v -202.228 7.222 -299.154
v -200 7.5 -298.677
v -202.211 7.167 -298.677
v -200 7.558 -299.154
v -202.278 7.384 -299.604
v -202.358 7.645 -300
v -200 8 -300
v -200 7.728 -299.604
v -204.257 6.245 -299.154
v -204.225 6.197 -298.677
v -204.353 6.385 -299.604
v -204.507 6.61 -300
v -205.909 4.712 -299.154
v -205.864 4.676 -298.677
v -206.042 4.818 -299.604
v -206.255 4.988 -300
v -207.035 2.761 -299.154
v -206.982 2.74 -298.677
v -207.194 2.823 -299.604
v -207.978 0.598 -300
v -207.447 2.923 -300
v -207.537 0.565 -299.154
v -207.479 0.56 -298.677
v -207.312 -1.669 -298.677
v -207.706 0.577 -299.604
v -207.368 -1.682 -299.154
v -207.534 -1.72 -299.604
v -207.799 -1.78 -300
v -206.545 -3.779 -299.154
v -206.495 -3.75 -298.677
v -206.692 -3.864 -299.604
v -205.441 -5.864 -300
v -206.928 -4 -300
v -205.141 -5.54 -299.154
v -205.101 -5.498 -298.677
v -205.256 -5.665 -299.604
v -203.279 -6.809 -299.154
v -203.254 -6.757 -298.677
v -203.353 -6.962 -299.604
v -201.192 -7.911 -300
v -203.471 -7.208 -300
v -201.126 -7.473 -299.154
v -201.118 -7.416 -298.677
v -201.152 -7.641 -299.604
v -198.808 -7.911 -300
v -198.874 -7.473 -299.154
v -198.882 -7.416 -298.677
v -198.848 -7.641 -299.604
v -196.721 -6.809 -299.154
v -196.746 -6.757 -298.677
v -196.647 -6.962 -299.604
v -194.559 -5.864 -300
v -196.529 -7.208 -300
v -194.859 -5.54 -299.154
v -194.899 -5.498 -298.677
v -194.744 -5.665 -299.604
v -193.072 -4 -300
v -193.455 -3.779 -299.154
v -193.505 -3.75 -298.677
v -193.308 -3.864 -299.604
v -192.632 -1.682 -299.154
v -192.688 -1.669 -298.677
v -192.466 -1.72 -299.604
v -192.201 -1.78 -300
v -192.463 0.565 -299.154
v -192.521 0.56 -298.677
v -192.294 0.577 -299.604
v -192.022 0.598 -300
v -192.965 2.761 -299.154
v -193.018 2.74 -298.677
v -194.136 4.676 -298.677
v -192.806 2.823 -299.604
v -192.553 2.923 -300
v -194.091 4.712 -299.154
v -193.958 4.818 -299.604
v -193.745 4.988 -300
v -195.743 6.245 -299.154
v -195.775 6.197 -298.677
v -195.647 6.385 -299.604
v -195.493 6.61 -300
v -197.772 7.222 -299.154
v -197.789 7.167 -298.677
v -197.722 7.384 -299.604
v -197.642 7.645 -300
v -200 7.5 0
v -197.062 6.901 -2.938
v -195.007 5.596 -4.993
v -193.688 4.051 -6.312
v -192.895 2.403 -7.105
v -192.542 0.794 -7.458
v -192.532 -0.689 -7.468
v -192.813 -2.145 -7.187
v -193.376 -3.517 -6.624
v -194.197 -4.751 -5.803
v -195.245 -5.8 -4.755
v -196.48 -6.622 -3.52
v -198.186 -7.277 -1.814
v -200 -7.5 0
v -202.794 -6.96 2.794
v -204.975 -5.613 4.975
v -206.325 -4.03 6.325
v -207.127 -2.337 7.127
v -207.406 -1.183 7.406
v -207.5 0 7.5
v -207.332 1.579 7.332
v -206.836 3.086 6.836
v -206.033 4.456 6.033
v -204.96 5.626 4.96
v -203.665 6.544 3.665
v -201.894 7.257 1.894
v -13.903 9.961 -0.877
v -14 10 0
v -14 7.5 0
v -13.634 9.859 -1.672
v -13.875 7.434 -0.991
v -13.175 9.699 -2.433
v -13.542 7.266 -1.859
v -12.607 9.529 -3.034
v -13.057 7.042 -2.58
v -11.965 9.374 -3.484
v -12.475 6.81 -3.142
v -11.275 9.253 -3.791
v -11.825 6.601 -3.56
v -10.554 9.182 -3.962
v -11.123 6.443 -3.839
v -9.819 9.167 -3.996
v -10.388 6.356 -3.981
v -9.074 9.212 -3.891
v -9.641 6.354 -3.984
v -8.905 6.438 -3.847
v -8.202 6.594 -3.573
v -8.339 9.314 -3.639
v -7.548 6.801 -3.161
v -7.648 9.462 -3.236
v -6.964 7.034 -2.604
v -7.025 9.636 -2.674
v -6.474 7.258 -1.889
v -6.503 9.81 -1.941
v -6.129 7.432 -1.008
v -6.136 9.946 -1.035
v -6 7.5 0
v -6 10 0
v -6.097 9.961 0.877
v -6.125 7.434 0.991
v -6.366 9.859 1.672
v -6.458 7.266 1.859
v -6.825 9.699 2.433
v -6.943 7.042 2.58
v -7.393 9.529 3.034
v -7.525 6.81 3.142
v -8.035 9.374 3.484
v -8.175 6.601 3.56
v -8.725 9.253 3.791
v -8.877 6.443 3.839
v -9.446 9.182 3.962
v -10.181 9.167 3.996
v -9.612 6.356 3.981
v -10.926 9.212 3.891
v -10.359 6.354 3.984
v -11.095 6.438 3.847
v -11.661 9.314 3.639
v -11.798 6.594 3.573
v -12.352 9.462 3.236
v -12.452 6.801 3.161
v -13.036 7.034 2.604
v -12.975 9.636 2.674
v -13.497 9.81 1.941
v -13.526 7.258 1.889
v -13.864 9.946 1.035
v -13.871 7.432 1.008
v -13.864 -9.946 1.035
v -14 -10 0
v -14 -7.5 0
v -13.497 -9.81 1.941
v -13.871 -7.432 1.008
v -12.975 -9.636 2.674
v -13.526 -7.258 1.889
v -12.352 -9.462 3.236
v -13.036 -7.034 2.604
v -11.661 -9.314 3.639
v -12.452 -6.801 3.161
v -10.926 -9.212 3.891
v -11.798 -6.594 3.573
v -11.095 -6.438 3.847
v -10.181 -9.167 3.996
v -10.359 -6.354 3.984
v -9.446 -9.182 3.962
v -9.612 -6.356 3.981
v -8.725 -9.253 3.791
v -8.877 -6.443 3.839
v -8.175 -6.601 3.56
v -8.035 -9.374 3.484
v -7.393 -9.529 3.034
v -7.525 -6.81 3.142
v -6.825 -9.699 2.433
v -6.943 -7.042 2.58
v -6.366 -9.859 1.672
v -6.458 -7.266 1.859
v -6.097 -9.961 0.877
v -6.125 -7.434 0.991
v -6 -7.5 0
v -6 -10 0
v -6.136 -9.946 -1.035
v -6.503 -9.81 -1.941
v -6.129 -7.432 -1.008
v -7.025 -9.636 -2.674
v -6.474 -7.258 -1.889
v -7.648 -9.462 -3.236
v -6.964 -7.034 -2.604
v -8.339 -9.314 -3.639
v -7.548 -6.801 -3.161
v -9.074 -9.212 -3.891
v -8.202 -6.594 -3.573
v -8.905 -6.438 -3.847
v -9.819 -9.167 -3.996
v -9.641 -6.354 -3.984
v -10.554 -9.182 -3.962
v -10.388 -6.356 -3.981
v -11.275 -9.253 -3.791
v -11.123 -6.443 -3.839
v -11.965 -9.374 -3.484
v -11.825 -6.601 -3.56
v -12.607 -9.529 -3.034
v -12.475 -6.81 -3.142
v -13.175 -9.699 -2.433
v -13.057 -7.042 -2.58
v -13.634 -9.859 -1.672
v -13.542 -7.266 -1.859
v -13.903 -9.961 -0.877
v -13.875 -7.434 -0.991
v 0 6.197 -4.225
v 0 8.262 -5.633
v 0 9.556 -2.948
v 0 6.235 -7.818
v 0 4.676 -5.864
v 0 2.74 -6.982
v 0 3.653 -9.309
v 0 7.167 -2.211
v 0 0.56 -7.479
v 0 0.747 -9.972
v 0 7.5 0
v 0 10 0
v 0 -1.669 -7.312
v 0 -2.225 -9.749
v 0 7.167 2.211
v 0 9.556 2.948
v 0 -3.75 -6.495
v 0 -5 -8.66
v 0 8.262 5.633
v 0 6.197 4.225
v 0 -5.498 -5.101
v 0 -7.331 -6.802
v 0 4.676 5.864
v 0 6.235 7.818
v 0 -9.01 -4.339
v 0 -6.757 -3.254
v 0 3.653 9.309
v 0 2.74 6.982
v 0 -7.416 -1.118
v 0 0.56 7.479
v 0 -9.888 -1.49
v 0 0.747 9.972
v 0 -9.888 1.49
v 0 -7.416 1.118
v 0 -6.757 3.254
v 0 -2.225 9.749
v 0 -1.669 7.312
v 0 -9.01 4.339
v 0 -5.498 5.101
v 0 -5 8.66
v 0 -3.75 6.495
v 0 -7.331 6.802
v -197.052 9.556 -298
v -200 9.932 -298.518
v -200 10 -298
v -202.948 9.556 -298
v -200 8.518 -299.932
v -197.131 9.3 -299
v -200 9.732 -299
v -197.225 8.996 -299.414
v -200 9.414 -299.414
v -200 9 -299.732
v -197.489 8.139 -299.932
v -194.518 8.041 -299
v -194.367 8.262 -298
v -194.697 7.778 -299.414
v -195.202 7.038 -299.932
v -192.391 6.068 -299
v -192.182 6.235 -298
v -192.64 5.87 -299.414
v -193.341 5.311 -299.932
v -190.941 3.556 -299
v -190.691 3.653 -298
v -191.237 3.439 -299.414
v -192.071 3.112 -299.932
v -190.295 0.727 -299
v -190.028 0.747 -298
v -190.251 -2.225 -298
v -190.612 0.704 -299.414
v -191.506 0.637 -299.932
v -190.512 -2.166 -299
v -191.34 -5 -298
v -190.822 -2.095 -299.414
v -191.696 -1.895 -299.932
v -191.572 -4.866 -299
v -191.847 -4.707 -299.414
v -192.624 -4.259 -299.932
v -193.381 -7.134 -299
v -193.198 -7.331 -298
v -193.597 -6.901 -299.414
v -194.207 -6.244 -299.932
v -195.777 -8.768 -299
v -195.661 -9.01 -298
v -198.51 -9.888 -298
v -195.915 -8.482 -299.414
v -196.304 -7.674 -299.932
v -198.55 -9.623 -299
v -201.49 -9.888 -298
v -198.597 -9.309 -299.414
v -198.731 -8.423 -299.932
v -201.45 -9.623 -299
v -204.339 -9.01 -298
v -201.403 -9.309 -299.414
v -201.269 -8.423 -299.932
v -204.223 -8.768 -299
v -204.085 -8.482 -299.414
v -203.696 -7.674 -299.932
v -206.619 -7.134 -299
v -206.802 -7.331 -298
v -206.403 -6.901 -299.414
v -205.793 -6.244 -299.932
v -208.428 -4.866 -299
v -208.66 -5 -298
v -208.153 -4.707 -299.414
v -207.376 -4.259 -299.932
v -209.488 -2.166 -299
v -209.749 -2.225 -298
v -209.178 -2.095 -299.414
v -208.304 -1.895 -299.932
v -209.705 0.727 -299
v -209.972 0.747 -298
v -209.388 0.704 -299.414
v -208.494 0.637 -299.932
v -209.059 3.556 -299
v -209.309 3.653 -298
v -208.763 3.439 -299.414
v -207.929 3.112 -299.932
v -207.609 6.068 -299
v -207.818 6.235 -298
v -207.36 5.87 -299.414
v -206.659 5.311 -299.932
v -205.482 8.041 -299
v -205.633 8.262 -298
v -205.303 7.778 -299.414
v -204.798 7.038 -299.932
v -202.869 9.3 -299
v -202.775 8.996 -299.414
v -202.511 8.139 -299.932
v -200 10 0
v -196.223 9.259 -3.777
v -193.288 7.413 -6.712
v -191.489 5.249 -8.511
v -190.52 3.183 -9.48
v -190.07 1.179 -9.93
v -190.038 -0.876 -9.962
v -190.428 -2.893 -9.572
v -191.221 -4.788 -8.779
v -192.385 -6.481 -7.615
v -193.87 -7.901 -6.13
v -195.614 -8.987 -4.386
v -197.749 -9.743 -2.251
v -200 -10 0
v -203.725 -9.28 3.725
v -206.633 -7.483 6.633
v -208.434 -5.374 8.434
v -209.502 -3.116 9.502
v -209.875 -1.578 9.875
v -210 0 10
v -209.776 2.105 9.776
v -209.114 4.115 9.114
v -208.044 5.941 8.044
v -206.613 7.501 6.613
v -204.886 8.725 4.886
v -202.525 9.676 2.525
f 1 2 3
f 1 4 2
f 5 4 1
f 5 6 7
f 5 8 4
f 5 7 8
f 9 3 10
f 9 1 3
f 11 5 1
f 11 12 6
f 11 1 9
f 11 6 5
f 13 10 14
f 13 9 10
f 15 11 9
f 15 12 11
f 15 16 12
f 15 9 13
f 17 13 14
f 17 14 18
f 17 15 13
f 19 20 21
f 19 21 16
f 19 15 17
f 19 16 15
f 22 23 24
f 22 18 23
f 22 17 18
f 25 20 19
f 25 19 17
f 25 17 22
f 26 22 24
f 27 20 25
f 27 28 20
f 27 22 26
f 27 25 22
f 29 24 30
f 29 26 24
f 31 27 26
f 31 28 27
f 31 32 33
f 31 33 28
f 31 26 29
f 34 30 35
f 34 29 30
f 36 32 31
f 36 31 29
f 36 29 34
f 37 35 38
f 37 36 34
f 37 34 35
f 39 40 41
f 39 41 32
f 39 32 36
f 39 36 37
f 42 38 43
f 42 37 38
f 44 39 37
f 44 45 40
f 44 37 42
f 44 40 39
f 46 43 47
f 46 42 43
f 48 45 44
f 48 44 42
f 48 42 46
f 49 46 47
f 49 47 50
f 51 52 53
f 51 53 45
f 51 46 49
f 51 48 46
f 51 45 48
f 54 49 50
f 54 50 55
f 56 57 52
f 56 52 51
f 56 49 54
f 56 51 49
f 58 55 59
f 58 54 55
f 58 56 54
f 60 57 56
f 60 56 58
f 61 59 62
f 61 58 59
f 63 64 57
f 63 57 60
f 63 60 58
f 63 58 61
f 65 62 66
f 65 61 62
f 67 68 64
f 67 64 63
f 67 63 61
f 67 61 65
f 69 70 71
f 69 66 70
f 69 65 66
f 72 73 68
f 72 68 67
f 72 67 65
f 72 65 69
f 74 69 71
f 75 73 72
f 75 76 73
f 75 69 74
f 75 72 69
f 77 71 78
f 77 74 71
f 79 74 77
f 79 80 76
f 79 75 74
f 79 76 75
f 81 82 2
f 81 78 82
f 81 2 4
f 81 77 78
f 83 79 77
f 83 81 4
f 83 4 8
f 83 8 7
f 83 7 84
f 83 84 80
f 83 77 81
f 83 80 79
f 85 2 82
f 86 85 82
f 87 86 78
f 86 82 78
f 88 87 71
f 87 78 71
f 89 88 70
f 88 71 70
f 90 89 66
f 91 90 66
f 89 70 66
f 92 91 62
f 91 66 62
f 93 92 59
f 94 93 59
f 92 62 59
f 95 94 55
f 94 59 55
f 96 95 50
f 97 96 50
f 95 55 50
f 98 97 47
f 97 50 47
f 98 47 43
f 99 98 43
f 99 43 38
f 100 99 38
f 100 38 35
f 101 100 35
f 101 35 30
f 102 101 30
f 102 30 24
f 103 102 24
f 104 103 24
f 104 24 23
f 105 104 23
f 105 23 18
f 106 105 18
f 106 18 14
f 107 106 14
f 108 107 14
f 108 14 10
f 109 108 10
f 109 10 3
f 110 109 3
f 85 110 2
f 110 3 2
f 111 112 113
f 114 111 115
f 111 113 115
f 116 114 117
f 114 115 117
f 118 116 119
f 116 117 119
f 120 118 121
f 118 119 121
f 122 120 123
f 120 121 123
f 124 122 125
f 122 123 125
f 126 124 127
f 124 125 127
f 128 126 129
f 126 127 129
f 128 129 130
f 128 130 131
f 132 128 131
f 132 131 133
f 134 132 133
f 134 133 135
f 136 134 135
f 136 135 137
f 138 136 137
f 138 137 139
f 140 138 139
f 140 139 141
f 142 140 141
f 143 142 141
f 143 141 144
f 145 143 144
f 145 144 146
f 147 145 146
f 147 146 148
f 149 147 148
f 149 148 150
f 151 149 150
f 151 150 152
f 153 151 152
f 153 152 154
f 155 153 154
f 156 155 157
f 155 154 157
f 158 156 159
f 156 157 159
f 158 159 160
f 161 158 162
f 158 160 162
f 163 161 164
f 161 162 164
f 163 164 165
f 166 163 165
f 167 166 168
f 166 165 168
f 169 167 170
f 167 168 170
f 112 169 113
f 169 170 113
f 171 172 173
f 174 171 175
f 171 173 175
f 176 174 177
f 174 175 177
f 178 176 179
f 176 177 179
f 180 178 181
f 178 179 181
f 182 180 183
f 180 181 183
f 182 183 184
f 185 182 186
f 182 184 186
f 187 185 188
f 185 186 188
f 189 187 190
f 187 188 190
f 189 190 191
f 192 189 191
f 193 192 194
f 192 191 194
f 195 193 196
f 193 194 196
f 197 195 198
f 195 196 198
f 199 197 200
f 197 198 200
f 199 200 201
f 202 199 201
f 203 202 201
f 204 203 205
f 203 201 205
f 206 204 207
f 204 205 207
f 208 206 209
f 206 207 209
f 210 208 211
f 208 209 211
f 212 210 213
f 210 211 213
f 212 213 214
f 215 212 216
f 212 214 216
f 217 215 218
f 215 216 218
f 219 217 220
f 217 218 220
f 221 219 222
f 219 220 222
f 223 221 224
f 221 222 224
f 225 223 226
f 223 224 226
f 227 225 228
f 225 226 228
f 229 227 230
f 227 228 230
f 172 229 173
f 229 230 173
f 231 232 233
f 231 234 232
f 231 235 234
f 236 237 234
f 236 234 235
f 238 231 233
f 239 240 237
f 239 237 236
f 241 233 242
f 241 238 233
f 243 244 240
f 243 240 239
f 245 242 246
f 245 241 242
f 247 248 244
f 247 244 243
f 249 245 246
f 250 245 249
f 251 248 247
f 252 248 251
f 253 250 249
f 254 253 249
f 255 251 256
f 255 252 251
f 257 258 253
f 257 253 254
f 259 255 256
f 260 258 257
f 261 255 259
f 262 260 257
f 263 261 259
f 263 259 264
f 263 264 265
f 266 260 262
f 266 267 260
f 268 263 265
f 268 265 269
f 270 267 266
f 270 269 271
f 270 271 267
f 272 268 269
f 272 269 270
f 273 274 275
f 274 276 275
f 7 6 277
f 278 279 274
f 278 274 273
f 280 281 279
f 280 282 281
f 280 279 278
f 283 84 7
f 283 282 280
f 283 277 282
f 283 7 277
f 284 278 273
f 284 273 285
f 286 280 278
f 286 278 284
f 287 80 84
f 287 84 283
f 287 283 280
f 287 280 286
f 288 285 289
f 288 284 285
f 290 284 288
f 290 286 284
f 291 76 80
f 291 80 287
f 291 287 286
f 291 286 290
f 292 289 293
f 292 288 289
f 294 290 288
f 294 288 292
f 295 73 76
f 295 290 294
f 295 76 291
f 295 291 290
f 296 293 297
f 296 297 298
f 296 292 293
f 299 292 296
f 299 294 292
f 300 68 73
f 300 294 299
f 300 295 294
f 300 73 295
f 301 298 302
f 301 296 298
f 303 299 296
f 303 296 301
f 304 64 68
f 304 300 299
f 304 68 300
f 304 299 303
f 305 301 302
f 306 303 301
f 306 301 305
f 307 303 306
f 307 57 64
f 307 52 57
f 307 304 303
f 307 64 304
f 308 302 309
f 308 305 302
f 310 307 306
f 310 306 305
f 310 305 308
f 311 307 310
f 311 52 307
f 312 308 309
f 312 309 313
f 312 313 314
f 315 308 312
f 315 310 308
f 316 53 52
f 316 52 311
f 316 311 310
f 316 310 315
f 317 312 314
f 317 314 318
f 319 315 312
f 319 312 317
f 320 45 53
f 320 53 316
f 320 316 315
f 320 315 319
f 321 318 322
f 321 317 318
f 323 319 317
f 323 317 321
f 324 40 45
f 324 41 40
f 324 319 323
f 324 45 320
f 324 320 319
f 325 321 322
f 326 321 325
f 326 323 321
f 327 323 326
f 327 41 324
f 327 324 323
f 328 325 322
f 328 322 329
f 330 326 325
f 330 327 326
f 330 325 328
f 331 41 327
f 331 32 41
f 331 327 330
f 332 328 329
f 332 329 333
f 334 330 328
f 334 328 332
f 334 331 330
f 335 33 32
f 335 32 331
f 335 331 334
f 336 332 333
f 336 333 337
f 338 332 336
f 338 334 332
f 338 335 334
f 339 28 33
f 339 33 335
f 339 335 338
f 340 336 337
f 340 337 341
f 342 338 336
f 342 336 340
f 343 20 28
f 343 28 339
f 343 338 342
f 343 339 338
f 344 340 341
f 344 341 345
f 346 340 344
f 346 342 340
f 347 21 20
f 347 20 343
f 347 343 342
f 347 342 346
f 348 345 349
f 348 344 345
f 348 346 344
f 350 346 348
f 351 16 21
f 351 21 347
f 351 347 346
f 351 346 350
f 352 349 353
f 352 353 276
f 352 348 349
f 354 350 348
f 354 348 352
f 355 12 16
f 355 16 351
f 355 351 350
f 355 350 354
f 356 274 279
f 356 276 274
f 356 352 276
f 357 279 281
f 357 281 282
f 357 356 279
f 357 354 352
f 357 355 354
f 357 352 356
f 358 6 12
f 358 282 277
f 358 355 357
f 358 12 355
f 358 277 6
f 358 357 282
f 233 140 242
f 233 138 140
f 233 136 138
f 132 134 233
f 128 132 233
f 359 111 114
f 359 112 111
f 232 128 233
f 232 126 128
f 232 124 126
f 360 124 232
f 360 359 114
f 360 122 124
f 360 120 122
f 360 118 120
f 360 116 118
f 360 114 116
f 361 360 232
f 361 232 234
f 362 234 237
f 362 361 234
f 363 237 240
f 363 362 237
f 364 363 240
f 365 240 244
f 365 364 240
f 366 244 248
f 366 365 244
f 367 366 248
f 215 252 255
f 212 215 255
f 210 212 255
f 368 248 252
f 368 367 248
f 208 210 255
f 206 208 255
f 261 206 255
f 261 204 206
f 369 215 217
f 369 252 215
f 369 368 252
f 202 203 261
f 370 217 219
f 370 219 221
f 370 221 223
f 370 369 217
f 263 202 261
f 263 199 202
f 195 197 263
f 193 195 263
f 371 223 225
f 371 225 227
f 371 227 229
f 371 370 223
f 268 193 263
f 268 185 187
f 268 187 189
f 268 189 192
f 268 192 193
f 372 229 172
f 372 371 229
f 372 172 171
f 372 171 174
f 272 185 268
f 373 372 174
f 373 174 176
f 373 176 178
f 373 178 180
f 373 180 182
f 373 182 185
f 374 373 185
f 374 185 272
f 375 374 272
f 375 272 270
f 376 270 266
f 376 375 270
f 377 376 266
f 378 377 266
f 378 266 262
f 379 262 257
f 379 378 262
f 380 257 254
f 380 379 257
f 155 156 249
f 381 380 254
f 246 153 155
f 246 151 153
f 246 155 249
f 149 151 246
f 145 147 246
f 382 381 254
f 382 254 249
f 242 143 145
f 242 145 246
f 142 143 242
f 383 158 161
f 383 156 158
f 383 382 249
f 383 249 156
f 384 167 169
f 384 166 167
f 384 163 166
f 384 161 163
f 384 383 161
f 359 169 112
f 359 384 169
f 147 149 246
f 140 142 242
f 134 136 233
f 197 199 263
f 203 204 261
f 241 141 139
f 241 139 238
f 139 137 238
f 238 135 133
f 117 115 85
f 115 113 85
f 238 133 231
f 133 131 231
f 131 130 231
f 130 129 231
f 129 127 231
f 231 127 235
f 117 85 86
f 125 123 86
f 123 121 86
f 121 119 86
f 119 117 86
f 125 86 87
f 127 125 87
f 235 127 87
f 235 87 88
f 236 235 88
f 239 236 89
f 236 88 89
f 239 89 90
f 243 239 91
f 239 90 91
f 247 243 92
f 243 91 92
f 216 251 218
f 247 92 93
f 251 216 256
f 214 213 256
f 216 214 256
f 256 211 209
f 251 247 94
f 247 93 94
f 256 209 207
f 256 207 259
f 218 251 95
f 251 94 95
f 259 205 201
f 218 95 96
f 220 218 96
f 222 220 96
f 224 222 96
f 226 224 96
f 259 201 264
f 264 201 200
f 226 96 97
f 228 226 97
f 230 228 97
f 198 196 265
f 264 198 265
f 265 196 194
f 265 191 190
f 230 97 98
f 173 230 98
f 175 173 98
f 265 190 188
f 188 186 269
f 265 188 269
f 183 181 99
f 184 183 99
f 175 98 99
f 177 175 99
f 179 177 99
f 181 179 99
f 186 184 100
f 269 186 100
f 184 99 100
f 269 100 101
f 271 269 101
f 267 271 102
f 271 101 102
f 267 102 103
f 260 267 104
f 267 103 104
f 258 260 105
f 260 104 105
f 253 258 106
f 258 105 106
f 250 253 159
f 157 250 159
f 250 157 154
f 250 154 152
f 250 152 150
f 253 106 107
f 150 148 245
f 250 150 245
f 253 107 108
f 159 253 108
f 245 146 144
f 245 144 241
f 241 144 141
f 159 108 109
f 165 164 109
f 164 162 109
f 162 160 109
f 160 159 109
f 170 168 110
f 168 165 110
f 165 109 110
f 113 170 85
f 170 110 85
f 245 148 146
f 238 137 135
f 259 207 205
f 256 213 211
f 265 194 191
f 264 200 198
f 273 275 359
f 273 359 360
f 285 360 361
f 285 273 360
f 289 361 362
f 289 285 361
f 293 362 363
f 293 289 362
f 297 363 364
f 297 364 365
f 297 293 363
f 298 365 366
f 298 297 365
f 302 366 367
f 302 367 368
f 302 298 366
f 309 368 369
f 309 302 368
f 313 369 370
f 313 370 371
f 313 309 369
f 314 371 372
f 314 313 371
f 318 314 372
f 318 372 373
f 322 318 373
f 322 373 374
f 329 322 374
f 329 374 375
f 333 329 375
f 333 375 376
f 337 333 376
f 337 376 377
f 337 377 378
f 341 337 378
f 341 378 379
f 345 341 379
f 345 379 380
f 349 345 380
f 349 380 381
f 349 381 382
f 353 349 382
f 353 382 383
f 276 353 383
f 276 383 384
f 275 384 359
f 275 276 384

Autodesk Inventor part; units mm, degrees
ref_plane "YZ Plane" through (0, 0, 0) normal (1, 0, 0) x (0, 1, 0)
ref_plane "XZ Plane" through (0, 0, 0) normal (0, 1, 0) x (-1, 0, 0)
ref_plane "XY Plane" through (0, 0, 0) normal (0, 0, 1) x (1, 0, 0)
sketch "Skizze12" plane through (0, 0, 0) normal (0, 1, 0) x (-1, 0, 0)
  line L0 (0, 0) -> (200, 0)
  line L1 (200, 0) -> (200, -300)
  dimension "d28" = 200
  dimension "d29" = 300
sketch "Skizze13" plane through (0, 0, 0) normal (1, 0, 0) x (0, 1, 0)
  circle A0 centre (0, 0) radius 10
  circle A1 centre (0, 0) radius 7.5
  dimension "d30" = 20
  dimension "d31" = 15
sweep "Sweeping2" add profiles "Skizze13" path "Skizze12"
sketch "Skizze14" plane through (0, 0, 0) normal (0, 1, 0) x (-1, 0, 0)
  line L0 (0, 0) -> (10, 0)
  circle A0 centre (10, 0) radius 4
  dimension "d34" = 10
  dimension "d35" = 8
extrude "Extrusion3" cut sketch "Skizze14" along normal through all both and the other way through all
fillet "Rundung1" radius 2 2 edges at (-200, -10, -300) (-200, -7.5, -300)
properties part number "Steuerhebel" material "Edelstahl"
